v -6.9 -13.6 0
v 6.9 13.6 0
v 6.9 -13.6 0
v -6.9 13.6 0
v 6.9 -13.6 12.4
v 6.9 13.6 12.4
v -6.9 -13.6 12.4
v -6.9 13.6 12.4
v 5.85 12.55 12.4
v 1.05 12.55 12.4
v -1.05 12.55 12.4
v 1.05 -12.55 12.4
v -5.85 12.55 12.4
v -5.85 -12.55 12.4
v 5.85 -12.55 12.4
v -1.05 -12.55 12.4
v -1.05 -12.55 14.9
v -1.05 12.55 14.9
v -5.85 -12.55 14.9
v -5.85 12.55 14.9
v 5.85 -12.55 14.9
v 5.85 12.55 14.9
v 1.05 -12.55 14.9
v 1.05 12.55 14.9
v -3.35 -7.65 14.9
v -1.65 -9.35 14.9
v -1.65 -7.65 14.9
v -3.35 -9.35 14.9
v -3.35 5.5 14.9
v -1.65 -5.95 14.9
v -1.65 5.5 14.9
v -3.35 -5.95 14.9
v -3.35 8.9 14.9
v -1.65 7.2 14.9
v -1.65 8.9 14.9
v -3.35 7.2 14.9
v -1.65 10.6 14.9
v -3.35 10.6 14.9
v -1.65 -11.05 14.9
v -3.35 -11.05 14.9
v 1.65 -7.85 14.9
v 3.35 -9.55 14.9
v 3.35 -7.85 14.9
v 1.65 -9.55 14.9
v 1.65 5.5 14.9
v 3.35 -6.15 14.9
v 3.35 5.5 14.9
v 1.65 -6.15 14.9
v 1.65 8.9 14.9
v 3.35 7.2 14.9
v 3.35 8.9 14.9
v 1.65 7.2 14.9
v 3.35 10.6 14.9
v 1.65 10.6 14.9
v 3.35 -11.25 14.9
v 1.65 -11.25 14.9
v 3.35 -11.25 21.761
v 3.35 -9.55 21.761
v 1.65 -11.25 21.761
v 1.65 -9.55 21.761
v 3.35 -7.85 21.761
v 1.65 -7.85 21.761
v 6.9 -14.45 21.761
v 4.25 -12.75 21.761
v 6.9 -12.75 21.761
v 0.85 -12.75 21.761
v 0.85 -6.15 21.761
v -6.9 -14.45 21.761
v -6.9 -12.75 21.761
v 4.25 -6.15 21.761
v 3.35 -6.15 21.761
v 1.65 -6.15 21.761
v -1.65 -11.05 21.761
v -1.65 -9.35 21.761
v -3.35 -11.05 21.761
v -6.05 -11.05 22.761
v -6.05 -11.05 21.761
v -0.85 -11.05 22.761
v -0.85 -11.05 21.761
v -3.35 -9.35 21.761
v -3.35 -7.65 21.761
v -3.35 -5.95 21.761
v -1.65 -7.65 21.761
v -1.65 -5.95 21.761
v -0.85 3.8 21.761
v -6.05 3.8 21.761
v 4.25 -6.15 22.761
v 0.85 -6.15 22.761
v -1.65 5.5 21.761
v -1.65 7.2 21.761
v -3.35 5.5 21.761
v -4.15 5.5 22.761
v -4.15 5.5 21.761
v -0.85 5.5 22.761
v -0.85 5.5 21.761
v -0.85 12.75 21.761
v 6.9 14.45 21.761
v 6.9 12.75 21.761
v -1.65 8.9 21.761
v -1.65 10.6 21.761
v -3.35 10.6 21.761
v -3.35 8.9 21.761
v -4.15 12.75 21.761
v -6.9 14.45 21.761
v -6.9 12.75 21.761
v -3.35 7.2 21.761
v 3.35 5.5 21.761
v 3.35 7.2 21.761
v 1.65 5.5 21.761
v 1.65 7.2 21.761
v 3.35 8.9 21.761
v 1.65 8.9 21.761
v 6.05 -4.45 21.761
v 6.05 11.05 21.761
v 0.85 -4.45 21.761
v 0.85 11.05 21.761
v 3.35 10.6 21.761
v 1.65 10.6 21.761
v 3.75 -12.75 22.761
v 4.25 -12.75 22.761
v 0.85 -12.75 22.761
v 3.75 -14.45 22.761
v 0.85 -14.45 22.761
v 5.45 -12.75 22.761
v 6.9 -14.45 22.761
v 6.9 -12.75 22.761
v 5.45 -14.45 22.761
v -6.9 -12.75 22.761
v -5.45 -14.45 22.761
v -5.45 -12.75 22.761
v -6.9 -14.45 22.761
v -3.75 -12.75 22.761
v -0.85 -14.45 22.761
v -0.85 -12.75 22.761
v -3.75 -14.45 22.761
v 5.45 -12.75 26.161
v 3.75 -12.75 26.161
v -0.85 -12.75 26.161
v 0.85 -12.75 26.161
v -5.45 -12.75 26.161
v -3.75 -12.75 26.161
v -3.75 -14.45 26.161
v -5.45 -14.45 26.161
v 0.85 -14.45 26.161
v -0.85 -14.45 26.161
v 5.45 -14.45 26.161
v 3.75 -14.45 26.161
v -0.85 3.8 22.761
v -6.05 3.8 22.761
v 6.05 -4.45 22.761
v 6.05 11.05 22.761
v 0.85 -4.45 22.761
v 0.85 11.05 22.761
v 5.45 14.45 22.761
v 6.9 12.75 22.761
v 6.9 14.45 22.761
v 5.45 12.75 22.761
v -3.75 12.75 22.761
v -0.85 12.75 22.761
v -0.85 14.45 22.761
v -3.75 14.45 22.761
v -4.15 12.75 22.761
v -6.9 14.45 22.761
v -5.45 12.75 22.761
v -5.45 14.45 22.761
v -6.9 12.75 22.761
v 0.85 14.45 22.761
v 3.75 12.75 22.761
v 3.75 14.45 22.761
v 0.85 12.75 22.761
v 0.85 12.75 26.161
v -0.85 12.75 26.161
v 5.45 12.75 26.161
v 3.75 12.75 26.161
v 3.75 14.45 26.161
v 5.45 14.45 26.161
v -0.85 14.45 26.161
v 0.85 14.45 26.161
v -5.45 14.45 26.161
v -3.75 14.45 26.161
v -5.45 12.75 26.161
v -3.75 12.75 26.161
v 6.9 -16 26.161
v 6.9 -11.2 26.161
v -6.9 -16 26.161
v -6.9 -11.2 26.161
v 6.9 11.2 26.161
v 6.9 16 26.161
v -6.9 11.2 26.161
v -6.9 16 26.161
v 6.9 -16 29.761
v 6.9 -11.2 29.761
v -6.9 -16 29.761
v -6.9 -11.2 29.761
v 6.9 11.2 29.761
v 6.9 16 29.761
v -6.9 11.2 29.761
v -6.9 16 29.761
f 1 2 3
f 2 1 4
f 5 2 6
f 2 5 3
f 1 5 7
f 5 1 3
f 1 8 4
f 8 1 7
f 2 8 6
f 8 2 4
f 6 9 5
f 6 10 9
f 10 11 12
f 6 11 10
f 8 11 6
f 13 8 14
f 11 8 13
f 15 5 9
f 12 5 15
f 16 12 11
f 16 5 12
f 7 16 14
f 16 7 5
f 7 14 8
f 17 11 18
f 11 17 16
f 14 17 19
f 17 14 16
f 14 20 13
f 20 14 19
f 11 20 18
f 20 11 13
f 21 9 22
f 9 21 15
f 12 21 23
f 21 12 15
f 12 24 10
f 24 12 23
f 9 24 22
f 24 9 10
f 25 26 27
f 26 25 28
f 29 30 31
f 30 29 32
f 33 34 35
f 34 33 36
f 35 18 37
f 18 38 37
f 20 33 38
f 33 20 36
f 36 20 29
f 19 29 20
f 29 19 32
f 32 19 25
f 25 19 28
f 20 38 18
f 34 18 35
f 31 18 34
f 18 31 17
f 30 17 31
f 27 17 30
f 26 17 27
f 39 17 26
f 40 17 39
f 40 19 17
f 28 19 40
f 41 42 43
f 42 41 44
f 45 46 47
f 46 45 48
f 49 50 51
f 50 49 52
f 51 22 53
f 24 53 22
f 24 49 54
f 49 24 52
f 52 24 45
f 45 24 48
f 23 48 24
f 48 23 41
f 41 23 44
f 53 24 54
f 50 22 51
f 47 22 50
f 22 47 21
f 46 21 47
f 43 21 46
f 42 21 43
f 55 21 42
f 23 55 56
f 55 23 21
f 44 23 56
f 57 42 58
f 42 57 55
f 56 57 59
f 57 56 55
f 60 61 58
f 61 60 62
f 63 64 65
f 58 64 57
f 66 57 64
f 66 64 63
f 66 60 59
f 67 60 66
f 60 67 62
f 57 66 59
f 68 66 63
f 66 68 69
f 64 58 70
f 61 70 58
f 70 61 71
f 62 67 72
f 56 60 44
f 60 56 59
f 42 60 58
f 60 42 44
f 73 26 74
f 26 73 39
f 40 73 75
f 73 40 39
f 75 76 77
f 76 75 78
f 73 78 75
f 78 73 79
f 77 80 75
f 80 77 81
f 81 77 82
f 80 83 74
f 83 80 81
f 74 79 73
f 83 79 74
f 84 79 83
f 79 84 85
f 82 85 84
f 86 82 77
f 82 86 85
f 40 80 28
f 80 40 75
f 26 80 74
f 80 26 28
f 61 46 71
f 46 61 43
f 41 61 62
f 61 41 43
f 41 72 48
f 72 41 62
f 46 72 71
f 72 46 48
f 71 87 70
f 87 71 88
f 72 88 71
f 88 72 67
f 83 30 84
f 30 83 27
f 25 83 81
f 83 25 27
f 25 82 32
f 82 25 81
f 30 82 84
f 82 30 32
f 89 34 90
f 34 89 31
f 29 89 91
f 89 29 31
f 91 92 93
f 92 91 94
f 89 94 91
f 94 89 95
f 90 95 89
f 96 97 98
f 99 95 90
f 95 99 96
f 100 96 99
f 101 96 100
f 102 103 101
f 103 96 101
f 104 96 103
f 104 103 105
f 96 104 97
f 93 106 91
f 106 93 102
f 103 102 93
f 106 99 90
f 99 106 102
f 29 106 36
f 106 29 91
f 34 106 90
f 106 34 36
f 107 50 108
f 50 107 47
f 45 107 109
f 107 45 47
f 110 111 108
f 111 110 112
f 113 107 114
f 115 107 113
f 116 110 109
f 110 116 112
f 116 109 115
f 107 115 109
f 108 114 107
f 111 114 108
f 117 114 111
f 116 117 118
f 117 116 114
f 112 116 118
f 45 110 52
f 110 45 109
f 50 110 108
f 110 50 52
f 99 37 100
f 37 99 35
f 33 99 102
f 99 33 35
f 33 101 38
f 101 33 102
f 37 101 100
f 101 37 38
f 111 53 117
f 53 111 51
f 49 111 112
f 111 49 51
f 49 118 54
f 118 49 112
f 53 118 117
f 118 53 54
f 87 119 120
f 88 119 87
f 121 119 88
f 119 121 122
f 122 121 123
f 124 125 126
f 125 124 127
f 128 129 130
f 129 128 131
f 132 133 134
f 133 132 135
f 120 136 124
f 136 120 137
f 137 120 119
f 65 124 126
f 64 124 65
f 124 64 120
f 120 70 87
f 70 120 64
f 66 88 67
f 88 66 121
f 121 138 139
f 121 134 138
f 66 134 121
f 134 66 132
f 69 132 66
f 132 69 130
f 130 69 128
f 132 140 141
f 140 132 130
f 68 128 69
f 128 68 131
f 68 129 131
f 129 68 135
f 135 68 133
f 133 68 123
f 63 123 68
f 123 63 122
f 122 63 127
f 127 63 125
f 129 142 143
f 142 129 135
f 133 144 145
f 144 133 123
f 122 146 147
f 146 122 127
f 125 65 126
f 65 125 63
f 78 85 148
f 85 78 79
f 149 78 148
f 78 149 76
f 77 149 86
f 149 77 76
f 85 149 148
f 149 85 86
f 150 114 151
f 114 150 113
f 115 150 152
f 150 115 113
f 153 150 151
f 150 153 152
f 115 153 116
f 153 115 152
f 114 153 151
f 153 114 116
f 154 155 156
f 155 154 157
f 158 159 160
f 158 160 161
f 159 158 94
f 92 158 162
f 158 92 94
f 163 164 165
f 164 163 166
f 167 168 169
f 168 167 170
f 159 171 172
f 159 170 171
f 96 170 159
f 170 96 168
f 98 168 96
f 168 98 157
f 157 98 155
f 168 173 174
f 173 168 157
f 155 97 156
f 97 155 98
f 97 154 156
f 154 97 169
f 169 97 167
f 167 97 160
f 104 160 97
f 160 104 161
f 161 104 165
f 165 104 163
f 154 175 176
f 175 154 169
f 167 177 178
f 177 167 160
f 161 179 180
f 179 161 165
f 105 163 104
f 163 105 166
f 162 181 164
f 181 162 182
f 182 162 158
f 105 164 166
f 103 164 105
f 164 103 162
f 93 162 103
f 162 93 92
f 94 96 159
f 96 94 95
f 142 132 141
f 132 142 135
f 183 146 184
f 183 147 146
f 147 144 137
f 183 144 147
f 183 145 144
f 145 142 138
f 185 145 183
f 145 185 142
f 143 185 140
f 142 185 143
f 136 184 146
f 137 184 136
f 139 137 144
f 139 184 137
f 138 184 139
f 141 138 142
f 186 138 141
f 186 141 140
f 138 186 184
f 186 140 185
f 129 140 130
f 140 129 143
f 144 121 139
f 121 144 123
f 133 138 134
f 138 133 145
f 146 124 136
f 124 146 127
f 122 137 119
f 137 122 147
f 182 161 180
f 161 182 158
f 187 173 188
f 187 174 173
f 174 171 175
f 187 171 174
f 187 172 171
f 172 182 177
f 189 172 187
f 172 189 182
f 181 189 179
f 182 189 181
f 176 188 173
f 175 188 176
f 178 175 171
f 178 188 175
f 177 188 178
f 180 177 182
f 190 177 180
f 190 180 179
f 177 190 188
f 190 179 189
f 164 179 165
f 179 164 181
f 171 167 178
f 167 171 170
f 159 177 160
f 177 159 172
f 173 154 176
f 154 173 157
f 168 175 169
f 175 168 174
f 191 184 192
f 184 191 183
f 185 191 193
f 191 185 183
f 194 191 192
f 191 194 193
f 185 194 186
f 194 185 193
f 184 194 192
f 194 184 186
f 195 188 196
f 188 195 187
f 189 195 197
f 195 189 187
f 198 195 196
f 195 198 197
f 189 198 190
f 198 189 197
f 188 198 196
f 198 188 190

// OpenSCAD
// Generated by SolidPython 0.4.2 on 2020-09-29 23:20:24
//!OpenSCAD

scale(v = 0.0100000000) {
	translate(v = [-690, -1360, 0]) {
		union() {
			color(c = [0.4000000000, 0.4000000000, 0.4000000000]) {
				translate(v = [0, 0, 0]) {
					linear_extrude(height = 1000.0000000000) {
						polygon(paths = [[0, 1, 2, 3]], points = [[0, 0], [0, 2720], [1380, 2720], [1380, 0]]);
					}
				}
			}
			color(c = [0.2000000000, 0.6000000000, 0.2000000000]) {
				translate(v = [0, 0, 1000.0000000000]) {
					linear_extrude(height = 120.0000000000) {
						polygon(paths = [[0, 1, 2, 3]], points = [[0, 1305], [0, 2720], [1380, 2720], [1380, 1305]]);
					}
				}
			}
			color(c = [0.4000000000, 0.4000000000, 0.4000000000]) {
				translate(v = [0, 0, 1000.0000000000]) {
					linear_extrude(height = 120.0000000000) {
						polygon(paths = [[0, 1, 2, 3]], points = [[0, 0], [0, 1305], [1380, 1305], [1380, 0]]);
					}
				}
			}
			color(c = [0.2000000000, 0.6000000000, 0.2000000000]) {
				translate(v = [0, 0, 1120.0000000000]) {
					linear_extrude(height = 120.0000000000) {
						polygon(paths = [[0, 1, 2, 3]], points = [[0, 1305], [0, 2720], [1380, 2720], [1380, 1305]]);
					}
				}
			}
			color(c = [0.4000000000, 0.4000000000, 0.4000000000]) {
				translate(v = [0, 0, 1120.0000000000]) {
					linear_extrude(height = 120.0000000000) {
						polygon(paths = [[0, 1, 2, 3]], points = [[0, 0], [0, 1305], [1380, 1305], [1380, 0]]);
					}
				}
			}
			color(c = [1.0000000000, 1.0000000000, 1.0000000000]) {
				translate(v = [0, 0, 1240.0000000000]) {
					linear_extrude(height = 70.0000000000) {
						polygon(paths = [[0, 1, 2, 3]], points = [[105, 105], [105, 2615], [585, 2615], [585, 105]]);
					}
				}
			}
			color(c = [1.0000000000, 1.0000000000, 1.0000000000]) {
				translate(v = [0, 0, 1240.0000000000]) {
					linear_extrude(height = 70.0000000000) {
						polygon(paths = [[0, 1, 2, 3]], points = [[795, 105], [795, 2615], [1275, 2615], [1275, 105]]);
					}
				}
			}
			color(c = [0.7000000000, 0, 0]) {
				translate(v = [0, 0, 1310.0000000000]) {
					linear_extrude(height = 180.0000000000) {
						polygon(paths = [[0, 1, 2, 3]], points = [[105, 105], [105, 2615], [585, 2615], [585, 105]]);
					}
				}
			}
			color(c = [0.7000000000, 0, 0]) {
				translate(v = [0, 0, 1310.0000000000]) {
					linear_extrude(height = 180.0000000000) {
						polygon(paths = [[0, 1, 2, 3]], points = [[795, 105], [795, 2615], [1275, 2615], [1275, 105]]);
					}
				}
			}
			color(c = [0.1000000000, 0.1000000000, 0.1000000000]) {
				translate(v = [0, 0, 1490.0000000000]) {
					linear_extrude(height = 686.1000000000) {
						polygon(paths = [[0, 1, 2, 3]], points = [[855, 235], [855, 405], [1025, 405], [1025, 235]]);
					}
				}
			}
			color(c = [0.1000000000, 0.1000000000, 0.1000000000]) {
				translate(v = [0, 0, 1490.0000000000]) {
					linear_extrude(height = 686.1000000000) {
						polygon(paths = [[0, 1, 2, 3]], points = [[355, 255], [355, 425], [525, 425], [525, 255]]);
					}
				}
			}
			color(c = [0.1000000000, 0.1000000000, 0.1000000000]) {
				translate(v = [0, 0, 1490.0000000000]) {
					linear_extrude(height = 686.1000000000) {
						polygon(paths = [[0, 1, 2, 3]], points = [[855, 575], [855, 745], [1025, 745], [1025, 575]]);
					}
				}
			}
			color(c = [0.1000000000, 0.1000000000, 0.1000000000]) {
				translate(v = [0, 0, 1490.0000000000]) {
					linear_extrude(height = 686.1000000000) {
						polygon(paths = [[0, 1, 2, 3]], points = [[355, 595], [355, 765], [525, 765], [525, 595]]);
					}
				}
			}
			color(c = [0.1000000000, 0.1000000000, 0.1000000000]) {
				translate(v = [0, 0, 1490.0000000000]) {
					linear_extrude(height = 686.1000000000) {
						polygon(paths = [[0, 1, 2, 3]], points = [[355, 1910], [355, 2080], [525, 2080], [525, 1910]]);
					}
				}
			}
			color(c = [0.1000000000, 0.1000000000, 0.1000000000]) {
				translate(v = [0, 0, 1490.0000000000]) {
					linear_extrude(height = 686.1000000000) {
						polygon(paths = [[0, 1, 2, 3]], points = [[855, 1910], [855, 2080], [1025, 2080], [1025, 1910]]);
					}
				}
			}
			color(c = [0.1000000000, 0.1000000000, 0.1000000000]) {
				translate(v = [0, 0, 1490.0000000000]) {
					linear_extrude(height = 686.1000000000) {
						polygon(paths = [[0, 1, 2, 3]], points = [[355, 2250], [355, 2420], [525, 2420], [525, 2250]]);
					}
				}
			}
			color(c = [0.1000000000, 0.1000000000, 0.1000000000]) {
				translate(v = [0, 0, 1490.0000000000]) {
					linear_extrude(height = 686.1000000000) {
						polygon(paths = [[0, 1, 2, 3]], points = [[855, 2250], [855, 2420], [1025, 2420], [1025, 2250]]);
					}
				}
			}
			color(c = [0.9000000000, 0.6000000000, 0.6000000000]) {
				translate(v = [0, 0, 2176.1000000000]) {
					linear_extrude(height = 100.0000000000) {
						polygon(paths = [[0, 1, 2, 3, 4, 5, 6, 7]], points = [[0, -85], [0, 85], [775, 85], [775, 745], [1115, 745], [1115, 85], [1380, 85], [1380, -85]]);
					}
				}
			}
			color(c = [0.9000000000, 0.6000000000, 0.6000000000]) {
				translate(v = [0, 0, 2176.1000000000]) {
					linear_extrude(height = 100.0000000000) {
						polygon(paths = [[0, 1, 2, 3]], points = [[85, 255], [85, 1740], [605, 1740], [605, 255]]);
					}
				}
			}
			color(c = [0.9000000000, 0.6000000000, 0.6000000000]) {
				translate(v = [0, 0, 2176.1000000000]) {
					linear_extrude(height = 100.0000000000) {
						polygon(paths = [[0, 1, 2, 3]], points = [[775, 915], [775, 2465], [1295, 2465], [1295, 915]]);
					}
				}
			}
			color(c = [0.9000000000, 0.6000000000, 0.6000000000]) {
				translate(v = [0, 0, 2176.1000000000]) {
					linear_extrude(height = 100.0000000000) {
						polygon(paths = [[0, 1, 2, 3, 4, 5, 6, 7]], points = [[275, 1910], [275, 2635], [0, 2635], [0, 2805], [1380, 2805], [1380, 2635], [605, 2635], [605, 1910]]);
					}
				}
			}
			color(c = [0.5000000000, 0.5000000000, 0.5000000000]) {
				translate(v = [0, 0, 2276.1000000000]) {
					linear_extrude(height = 340.0000000000) {
						polygon(paths = [[0, 1, 2, 3]], points = [[145, -85], [145, 85], [315, 85], [315, -85]]);
					}
				}
			}
			color(c = [0.5000000000, 0.5000000000, 0.5000000000]) {
				translate(v = [0, 0, 2276.1000000000]) {
					linear_extrude(height = 340.0000000000) {
						polygon(paths = [[0, 1, 2, 3]], points = [[605, -85], [605, 85], [775, 85], [775, -85]]);
					}
				}
			}
			color(c = [0.5000000000, 0.5000000000, 0.5000000000]) {
				translate(v = [0, 0, 2276.1000000000]) {
					linear_extrude(height = 340.0000000000) {
						polygon(paths = [[0, 1, 2, 3]], points = [[1065, -85], [1065, 85], [1235, 85], [1235, -85]]);
					}
				}
			}
			color(c = [0.5000000000, 0.5000000000, 0.5000000000]) {
				translate(v = [0, 0, 2276.1000000000]) {
					linear_extrude(height = 340.0000000000) {
						polygon(paths = [[0, 1, 2, 3]], points = [[145, 2635], [145, 2805], [315, 2805], [315, 2635]]);
					}
				}
			}
			color(c = [0.5000000000, 0.5000000000, 0.5000000000]) {
				translate(v = [0, 0, 2276.1000000000]) {
					linear_extrude(height = 340.0000000000) {
						polygon(paths = [[0, 1, 2, 3]], points = [[605, 2635], [605, 2805], [775, 2805], [775, 2635]]);
					}
				}
			}
			color(c = [0.5000000000, 0.5000000000, 0.5000000000]) {
				translate(v = [0, 0, 2276.1000000000]) {
					linear_extrude(height = 340.0000000000) {
						polygon(paths = [[0, 1, 2, 3]], points = [[1065, 2635], [1065, 2805], [1235, 2805], [1235, 2635]]);
					}
				}
			}
			color(c = [0.3000000000, 0.3000000000, 1]) {
				translate(v = [0, 0, 2616.1000000000]) {
					linear_extrude(height = 360.0000000000) {
						polygon(paths = [[0, 1, 2, 3]], points = [[0, -240], [0, 240], [1380, 240], [1380, -240]]);
					}
				}
			}
			color(c = [0.3000000000, 0.3000000000, 1]) {
				translate(v = [0, 0, 2616.1000000000]) {
					linear_extrude(height = 360.0000000000) {
						polygon(paths = [[0, 1, 2, 3]], points = [[0, 2480], [0, 2960], [1380, 2960], [1380, 2480]]);
					}
				}
			}
		}
	}
}
